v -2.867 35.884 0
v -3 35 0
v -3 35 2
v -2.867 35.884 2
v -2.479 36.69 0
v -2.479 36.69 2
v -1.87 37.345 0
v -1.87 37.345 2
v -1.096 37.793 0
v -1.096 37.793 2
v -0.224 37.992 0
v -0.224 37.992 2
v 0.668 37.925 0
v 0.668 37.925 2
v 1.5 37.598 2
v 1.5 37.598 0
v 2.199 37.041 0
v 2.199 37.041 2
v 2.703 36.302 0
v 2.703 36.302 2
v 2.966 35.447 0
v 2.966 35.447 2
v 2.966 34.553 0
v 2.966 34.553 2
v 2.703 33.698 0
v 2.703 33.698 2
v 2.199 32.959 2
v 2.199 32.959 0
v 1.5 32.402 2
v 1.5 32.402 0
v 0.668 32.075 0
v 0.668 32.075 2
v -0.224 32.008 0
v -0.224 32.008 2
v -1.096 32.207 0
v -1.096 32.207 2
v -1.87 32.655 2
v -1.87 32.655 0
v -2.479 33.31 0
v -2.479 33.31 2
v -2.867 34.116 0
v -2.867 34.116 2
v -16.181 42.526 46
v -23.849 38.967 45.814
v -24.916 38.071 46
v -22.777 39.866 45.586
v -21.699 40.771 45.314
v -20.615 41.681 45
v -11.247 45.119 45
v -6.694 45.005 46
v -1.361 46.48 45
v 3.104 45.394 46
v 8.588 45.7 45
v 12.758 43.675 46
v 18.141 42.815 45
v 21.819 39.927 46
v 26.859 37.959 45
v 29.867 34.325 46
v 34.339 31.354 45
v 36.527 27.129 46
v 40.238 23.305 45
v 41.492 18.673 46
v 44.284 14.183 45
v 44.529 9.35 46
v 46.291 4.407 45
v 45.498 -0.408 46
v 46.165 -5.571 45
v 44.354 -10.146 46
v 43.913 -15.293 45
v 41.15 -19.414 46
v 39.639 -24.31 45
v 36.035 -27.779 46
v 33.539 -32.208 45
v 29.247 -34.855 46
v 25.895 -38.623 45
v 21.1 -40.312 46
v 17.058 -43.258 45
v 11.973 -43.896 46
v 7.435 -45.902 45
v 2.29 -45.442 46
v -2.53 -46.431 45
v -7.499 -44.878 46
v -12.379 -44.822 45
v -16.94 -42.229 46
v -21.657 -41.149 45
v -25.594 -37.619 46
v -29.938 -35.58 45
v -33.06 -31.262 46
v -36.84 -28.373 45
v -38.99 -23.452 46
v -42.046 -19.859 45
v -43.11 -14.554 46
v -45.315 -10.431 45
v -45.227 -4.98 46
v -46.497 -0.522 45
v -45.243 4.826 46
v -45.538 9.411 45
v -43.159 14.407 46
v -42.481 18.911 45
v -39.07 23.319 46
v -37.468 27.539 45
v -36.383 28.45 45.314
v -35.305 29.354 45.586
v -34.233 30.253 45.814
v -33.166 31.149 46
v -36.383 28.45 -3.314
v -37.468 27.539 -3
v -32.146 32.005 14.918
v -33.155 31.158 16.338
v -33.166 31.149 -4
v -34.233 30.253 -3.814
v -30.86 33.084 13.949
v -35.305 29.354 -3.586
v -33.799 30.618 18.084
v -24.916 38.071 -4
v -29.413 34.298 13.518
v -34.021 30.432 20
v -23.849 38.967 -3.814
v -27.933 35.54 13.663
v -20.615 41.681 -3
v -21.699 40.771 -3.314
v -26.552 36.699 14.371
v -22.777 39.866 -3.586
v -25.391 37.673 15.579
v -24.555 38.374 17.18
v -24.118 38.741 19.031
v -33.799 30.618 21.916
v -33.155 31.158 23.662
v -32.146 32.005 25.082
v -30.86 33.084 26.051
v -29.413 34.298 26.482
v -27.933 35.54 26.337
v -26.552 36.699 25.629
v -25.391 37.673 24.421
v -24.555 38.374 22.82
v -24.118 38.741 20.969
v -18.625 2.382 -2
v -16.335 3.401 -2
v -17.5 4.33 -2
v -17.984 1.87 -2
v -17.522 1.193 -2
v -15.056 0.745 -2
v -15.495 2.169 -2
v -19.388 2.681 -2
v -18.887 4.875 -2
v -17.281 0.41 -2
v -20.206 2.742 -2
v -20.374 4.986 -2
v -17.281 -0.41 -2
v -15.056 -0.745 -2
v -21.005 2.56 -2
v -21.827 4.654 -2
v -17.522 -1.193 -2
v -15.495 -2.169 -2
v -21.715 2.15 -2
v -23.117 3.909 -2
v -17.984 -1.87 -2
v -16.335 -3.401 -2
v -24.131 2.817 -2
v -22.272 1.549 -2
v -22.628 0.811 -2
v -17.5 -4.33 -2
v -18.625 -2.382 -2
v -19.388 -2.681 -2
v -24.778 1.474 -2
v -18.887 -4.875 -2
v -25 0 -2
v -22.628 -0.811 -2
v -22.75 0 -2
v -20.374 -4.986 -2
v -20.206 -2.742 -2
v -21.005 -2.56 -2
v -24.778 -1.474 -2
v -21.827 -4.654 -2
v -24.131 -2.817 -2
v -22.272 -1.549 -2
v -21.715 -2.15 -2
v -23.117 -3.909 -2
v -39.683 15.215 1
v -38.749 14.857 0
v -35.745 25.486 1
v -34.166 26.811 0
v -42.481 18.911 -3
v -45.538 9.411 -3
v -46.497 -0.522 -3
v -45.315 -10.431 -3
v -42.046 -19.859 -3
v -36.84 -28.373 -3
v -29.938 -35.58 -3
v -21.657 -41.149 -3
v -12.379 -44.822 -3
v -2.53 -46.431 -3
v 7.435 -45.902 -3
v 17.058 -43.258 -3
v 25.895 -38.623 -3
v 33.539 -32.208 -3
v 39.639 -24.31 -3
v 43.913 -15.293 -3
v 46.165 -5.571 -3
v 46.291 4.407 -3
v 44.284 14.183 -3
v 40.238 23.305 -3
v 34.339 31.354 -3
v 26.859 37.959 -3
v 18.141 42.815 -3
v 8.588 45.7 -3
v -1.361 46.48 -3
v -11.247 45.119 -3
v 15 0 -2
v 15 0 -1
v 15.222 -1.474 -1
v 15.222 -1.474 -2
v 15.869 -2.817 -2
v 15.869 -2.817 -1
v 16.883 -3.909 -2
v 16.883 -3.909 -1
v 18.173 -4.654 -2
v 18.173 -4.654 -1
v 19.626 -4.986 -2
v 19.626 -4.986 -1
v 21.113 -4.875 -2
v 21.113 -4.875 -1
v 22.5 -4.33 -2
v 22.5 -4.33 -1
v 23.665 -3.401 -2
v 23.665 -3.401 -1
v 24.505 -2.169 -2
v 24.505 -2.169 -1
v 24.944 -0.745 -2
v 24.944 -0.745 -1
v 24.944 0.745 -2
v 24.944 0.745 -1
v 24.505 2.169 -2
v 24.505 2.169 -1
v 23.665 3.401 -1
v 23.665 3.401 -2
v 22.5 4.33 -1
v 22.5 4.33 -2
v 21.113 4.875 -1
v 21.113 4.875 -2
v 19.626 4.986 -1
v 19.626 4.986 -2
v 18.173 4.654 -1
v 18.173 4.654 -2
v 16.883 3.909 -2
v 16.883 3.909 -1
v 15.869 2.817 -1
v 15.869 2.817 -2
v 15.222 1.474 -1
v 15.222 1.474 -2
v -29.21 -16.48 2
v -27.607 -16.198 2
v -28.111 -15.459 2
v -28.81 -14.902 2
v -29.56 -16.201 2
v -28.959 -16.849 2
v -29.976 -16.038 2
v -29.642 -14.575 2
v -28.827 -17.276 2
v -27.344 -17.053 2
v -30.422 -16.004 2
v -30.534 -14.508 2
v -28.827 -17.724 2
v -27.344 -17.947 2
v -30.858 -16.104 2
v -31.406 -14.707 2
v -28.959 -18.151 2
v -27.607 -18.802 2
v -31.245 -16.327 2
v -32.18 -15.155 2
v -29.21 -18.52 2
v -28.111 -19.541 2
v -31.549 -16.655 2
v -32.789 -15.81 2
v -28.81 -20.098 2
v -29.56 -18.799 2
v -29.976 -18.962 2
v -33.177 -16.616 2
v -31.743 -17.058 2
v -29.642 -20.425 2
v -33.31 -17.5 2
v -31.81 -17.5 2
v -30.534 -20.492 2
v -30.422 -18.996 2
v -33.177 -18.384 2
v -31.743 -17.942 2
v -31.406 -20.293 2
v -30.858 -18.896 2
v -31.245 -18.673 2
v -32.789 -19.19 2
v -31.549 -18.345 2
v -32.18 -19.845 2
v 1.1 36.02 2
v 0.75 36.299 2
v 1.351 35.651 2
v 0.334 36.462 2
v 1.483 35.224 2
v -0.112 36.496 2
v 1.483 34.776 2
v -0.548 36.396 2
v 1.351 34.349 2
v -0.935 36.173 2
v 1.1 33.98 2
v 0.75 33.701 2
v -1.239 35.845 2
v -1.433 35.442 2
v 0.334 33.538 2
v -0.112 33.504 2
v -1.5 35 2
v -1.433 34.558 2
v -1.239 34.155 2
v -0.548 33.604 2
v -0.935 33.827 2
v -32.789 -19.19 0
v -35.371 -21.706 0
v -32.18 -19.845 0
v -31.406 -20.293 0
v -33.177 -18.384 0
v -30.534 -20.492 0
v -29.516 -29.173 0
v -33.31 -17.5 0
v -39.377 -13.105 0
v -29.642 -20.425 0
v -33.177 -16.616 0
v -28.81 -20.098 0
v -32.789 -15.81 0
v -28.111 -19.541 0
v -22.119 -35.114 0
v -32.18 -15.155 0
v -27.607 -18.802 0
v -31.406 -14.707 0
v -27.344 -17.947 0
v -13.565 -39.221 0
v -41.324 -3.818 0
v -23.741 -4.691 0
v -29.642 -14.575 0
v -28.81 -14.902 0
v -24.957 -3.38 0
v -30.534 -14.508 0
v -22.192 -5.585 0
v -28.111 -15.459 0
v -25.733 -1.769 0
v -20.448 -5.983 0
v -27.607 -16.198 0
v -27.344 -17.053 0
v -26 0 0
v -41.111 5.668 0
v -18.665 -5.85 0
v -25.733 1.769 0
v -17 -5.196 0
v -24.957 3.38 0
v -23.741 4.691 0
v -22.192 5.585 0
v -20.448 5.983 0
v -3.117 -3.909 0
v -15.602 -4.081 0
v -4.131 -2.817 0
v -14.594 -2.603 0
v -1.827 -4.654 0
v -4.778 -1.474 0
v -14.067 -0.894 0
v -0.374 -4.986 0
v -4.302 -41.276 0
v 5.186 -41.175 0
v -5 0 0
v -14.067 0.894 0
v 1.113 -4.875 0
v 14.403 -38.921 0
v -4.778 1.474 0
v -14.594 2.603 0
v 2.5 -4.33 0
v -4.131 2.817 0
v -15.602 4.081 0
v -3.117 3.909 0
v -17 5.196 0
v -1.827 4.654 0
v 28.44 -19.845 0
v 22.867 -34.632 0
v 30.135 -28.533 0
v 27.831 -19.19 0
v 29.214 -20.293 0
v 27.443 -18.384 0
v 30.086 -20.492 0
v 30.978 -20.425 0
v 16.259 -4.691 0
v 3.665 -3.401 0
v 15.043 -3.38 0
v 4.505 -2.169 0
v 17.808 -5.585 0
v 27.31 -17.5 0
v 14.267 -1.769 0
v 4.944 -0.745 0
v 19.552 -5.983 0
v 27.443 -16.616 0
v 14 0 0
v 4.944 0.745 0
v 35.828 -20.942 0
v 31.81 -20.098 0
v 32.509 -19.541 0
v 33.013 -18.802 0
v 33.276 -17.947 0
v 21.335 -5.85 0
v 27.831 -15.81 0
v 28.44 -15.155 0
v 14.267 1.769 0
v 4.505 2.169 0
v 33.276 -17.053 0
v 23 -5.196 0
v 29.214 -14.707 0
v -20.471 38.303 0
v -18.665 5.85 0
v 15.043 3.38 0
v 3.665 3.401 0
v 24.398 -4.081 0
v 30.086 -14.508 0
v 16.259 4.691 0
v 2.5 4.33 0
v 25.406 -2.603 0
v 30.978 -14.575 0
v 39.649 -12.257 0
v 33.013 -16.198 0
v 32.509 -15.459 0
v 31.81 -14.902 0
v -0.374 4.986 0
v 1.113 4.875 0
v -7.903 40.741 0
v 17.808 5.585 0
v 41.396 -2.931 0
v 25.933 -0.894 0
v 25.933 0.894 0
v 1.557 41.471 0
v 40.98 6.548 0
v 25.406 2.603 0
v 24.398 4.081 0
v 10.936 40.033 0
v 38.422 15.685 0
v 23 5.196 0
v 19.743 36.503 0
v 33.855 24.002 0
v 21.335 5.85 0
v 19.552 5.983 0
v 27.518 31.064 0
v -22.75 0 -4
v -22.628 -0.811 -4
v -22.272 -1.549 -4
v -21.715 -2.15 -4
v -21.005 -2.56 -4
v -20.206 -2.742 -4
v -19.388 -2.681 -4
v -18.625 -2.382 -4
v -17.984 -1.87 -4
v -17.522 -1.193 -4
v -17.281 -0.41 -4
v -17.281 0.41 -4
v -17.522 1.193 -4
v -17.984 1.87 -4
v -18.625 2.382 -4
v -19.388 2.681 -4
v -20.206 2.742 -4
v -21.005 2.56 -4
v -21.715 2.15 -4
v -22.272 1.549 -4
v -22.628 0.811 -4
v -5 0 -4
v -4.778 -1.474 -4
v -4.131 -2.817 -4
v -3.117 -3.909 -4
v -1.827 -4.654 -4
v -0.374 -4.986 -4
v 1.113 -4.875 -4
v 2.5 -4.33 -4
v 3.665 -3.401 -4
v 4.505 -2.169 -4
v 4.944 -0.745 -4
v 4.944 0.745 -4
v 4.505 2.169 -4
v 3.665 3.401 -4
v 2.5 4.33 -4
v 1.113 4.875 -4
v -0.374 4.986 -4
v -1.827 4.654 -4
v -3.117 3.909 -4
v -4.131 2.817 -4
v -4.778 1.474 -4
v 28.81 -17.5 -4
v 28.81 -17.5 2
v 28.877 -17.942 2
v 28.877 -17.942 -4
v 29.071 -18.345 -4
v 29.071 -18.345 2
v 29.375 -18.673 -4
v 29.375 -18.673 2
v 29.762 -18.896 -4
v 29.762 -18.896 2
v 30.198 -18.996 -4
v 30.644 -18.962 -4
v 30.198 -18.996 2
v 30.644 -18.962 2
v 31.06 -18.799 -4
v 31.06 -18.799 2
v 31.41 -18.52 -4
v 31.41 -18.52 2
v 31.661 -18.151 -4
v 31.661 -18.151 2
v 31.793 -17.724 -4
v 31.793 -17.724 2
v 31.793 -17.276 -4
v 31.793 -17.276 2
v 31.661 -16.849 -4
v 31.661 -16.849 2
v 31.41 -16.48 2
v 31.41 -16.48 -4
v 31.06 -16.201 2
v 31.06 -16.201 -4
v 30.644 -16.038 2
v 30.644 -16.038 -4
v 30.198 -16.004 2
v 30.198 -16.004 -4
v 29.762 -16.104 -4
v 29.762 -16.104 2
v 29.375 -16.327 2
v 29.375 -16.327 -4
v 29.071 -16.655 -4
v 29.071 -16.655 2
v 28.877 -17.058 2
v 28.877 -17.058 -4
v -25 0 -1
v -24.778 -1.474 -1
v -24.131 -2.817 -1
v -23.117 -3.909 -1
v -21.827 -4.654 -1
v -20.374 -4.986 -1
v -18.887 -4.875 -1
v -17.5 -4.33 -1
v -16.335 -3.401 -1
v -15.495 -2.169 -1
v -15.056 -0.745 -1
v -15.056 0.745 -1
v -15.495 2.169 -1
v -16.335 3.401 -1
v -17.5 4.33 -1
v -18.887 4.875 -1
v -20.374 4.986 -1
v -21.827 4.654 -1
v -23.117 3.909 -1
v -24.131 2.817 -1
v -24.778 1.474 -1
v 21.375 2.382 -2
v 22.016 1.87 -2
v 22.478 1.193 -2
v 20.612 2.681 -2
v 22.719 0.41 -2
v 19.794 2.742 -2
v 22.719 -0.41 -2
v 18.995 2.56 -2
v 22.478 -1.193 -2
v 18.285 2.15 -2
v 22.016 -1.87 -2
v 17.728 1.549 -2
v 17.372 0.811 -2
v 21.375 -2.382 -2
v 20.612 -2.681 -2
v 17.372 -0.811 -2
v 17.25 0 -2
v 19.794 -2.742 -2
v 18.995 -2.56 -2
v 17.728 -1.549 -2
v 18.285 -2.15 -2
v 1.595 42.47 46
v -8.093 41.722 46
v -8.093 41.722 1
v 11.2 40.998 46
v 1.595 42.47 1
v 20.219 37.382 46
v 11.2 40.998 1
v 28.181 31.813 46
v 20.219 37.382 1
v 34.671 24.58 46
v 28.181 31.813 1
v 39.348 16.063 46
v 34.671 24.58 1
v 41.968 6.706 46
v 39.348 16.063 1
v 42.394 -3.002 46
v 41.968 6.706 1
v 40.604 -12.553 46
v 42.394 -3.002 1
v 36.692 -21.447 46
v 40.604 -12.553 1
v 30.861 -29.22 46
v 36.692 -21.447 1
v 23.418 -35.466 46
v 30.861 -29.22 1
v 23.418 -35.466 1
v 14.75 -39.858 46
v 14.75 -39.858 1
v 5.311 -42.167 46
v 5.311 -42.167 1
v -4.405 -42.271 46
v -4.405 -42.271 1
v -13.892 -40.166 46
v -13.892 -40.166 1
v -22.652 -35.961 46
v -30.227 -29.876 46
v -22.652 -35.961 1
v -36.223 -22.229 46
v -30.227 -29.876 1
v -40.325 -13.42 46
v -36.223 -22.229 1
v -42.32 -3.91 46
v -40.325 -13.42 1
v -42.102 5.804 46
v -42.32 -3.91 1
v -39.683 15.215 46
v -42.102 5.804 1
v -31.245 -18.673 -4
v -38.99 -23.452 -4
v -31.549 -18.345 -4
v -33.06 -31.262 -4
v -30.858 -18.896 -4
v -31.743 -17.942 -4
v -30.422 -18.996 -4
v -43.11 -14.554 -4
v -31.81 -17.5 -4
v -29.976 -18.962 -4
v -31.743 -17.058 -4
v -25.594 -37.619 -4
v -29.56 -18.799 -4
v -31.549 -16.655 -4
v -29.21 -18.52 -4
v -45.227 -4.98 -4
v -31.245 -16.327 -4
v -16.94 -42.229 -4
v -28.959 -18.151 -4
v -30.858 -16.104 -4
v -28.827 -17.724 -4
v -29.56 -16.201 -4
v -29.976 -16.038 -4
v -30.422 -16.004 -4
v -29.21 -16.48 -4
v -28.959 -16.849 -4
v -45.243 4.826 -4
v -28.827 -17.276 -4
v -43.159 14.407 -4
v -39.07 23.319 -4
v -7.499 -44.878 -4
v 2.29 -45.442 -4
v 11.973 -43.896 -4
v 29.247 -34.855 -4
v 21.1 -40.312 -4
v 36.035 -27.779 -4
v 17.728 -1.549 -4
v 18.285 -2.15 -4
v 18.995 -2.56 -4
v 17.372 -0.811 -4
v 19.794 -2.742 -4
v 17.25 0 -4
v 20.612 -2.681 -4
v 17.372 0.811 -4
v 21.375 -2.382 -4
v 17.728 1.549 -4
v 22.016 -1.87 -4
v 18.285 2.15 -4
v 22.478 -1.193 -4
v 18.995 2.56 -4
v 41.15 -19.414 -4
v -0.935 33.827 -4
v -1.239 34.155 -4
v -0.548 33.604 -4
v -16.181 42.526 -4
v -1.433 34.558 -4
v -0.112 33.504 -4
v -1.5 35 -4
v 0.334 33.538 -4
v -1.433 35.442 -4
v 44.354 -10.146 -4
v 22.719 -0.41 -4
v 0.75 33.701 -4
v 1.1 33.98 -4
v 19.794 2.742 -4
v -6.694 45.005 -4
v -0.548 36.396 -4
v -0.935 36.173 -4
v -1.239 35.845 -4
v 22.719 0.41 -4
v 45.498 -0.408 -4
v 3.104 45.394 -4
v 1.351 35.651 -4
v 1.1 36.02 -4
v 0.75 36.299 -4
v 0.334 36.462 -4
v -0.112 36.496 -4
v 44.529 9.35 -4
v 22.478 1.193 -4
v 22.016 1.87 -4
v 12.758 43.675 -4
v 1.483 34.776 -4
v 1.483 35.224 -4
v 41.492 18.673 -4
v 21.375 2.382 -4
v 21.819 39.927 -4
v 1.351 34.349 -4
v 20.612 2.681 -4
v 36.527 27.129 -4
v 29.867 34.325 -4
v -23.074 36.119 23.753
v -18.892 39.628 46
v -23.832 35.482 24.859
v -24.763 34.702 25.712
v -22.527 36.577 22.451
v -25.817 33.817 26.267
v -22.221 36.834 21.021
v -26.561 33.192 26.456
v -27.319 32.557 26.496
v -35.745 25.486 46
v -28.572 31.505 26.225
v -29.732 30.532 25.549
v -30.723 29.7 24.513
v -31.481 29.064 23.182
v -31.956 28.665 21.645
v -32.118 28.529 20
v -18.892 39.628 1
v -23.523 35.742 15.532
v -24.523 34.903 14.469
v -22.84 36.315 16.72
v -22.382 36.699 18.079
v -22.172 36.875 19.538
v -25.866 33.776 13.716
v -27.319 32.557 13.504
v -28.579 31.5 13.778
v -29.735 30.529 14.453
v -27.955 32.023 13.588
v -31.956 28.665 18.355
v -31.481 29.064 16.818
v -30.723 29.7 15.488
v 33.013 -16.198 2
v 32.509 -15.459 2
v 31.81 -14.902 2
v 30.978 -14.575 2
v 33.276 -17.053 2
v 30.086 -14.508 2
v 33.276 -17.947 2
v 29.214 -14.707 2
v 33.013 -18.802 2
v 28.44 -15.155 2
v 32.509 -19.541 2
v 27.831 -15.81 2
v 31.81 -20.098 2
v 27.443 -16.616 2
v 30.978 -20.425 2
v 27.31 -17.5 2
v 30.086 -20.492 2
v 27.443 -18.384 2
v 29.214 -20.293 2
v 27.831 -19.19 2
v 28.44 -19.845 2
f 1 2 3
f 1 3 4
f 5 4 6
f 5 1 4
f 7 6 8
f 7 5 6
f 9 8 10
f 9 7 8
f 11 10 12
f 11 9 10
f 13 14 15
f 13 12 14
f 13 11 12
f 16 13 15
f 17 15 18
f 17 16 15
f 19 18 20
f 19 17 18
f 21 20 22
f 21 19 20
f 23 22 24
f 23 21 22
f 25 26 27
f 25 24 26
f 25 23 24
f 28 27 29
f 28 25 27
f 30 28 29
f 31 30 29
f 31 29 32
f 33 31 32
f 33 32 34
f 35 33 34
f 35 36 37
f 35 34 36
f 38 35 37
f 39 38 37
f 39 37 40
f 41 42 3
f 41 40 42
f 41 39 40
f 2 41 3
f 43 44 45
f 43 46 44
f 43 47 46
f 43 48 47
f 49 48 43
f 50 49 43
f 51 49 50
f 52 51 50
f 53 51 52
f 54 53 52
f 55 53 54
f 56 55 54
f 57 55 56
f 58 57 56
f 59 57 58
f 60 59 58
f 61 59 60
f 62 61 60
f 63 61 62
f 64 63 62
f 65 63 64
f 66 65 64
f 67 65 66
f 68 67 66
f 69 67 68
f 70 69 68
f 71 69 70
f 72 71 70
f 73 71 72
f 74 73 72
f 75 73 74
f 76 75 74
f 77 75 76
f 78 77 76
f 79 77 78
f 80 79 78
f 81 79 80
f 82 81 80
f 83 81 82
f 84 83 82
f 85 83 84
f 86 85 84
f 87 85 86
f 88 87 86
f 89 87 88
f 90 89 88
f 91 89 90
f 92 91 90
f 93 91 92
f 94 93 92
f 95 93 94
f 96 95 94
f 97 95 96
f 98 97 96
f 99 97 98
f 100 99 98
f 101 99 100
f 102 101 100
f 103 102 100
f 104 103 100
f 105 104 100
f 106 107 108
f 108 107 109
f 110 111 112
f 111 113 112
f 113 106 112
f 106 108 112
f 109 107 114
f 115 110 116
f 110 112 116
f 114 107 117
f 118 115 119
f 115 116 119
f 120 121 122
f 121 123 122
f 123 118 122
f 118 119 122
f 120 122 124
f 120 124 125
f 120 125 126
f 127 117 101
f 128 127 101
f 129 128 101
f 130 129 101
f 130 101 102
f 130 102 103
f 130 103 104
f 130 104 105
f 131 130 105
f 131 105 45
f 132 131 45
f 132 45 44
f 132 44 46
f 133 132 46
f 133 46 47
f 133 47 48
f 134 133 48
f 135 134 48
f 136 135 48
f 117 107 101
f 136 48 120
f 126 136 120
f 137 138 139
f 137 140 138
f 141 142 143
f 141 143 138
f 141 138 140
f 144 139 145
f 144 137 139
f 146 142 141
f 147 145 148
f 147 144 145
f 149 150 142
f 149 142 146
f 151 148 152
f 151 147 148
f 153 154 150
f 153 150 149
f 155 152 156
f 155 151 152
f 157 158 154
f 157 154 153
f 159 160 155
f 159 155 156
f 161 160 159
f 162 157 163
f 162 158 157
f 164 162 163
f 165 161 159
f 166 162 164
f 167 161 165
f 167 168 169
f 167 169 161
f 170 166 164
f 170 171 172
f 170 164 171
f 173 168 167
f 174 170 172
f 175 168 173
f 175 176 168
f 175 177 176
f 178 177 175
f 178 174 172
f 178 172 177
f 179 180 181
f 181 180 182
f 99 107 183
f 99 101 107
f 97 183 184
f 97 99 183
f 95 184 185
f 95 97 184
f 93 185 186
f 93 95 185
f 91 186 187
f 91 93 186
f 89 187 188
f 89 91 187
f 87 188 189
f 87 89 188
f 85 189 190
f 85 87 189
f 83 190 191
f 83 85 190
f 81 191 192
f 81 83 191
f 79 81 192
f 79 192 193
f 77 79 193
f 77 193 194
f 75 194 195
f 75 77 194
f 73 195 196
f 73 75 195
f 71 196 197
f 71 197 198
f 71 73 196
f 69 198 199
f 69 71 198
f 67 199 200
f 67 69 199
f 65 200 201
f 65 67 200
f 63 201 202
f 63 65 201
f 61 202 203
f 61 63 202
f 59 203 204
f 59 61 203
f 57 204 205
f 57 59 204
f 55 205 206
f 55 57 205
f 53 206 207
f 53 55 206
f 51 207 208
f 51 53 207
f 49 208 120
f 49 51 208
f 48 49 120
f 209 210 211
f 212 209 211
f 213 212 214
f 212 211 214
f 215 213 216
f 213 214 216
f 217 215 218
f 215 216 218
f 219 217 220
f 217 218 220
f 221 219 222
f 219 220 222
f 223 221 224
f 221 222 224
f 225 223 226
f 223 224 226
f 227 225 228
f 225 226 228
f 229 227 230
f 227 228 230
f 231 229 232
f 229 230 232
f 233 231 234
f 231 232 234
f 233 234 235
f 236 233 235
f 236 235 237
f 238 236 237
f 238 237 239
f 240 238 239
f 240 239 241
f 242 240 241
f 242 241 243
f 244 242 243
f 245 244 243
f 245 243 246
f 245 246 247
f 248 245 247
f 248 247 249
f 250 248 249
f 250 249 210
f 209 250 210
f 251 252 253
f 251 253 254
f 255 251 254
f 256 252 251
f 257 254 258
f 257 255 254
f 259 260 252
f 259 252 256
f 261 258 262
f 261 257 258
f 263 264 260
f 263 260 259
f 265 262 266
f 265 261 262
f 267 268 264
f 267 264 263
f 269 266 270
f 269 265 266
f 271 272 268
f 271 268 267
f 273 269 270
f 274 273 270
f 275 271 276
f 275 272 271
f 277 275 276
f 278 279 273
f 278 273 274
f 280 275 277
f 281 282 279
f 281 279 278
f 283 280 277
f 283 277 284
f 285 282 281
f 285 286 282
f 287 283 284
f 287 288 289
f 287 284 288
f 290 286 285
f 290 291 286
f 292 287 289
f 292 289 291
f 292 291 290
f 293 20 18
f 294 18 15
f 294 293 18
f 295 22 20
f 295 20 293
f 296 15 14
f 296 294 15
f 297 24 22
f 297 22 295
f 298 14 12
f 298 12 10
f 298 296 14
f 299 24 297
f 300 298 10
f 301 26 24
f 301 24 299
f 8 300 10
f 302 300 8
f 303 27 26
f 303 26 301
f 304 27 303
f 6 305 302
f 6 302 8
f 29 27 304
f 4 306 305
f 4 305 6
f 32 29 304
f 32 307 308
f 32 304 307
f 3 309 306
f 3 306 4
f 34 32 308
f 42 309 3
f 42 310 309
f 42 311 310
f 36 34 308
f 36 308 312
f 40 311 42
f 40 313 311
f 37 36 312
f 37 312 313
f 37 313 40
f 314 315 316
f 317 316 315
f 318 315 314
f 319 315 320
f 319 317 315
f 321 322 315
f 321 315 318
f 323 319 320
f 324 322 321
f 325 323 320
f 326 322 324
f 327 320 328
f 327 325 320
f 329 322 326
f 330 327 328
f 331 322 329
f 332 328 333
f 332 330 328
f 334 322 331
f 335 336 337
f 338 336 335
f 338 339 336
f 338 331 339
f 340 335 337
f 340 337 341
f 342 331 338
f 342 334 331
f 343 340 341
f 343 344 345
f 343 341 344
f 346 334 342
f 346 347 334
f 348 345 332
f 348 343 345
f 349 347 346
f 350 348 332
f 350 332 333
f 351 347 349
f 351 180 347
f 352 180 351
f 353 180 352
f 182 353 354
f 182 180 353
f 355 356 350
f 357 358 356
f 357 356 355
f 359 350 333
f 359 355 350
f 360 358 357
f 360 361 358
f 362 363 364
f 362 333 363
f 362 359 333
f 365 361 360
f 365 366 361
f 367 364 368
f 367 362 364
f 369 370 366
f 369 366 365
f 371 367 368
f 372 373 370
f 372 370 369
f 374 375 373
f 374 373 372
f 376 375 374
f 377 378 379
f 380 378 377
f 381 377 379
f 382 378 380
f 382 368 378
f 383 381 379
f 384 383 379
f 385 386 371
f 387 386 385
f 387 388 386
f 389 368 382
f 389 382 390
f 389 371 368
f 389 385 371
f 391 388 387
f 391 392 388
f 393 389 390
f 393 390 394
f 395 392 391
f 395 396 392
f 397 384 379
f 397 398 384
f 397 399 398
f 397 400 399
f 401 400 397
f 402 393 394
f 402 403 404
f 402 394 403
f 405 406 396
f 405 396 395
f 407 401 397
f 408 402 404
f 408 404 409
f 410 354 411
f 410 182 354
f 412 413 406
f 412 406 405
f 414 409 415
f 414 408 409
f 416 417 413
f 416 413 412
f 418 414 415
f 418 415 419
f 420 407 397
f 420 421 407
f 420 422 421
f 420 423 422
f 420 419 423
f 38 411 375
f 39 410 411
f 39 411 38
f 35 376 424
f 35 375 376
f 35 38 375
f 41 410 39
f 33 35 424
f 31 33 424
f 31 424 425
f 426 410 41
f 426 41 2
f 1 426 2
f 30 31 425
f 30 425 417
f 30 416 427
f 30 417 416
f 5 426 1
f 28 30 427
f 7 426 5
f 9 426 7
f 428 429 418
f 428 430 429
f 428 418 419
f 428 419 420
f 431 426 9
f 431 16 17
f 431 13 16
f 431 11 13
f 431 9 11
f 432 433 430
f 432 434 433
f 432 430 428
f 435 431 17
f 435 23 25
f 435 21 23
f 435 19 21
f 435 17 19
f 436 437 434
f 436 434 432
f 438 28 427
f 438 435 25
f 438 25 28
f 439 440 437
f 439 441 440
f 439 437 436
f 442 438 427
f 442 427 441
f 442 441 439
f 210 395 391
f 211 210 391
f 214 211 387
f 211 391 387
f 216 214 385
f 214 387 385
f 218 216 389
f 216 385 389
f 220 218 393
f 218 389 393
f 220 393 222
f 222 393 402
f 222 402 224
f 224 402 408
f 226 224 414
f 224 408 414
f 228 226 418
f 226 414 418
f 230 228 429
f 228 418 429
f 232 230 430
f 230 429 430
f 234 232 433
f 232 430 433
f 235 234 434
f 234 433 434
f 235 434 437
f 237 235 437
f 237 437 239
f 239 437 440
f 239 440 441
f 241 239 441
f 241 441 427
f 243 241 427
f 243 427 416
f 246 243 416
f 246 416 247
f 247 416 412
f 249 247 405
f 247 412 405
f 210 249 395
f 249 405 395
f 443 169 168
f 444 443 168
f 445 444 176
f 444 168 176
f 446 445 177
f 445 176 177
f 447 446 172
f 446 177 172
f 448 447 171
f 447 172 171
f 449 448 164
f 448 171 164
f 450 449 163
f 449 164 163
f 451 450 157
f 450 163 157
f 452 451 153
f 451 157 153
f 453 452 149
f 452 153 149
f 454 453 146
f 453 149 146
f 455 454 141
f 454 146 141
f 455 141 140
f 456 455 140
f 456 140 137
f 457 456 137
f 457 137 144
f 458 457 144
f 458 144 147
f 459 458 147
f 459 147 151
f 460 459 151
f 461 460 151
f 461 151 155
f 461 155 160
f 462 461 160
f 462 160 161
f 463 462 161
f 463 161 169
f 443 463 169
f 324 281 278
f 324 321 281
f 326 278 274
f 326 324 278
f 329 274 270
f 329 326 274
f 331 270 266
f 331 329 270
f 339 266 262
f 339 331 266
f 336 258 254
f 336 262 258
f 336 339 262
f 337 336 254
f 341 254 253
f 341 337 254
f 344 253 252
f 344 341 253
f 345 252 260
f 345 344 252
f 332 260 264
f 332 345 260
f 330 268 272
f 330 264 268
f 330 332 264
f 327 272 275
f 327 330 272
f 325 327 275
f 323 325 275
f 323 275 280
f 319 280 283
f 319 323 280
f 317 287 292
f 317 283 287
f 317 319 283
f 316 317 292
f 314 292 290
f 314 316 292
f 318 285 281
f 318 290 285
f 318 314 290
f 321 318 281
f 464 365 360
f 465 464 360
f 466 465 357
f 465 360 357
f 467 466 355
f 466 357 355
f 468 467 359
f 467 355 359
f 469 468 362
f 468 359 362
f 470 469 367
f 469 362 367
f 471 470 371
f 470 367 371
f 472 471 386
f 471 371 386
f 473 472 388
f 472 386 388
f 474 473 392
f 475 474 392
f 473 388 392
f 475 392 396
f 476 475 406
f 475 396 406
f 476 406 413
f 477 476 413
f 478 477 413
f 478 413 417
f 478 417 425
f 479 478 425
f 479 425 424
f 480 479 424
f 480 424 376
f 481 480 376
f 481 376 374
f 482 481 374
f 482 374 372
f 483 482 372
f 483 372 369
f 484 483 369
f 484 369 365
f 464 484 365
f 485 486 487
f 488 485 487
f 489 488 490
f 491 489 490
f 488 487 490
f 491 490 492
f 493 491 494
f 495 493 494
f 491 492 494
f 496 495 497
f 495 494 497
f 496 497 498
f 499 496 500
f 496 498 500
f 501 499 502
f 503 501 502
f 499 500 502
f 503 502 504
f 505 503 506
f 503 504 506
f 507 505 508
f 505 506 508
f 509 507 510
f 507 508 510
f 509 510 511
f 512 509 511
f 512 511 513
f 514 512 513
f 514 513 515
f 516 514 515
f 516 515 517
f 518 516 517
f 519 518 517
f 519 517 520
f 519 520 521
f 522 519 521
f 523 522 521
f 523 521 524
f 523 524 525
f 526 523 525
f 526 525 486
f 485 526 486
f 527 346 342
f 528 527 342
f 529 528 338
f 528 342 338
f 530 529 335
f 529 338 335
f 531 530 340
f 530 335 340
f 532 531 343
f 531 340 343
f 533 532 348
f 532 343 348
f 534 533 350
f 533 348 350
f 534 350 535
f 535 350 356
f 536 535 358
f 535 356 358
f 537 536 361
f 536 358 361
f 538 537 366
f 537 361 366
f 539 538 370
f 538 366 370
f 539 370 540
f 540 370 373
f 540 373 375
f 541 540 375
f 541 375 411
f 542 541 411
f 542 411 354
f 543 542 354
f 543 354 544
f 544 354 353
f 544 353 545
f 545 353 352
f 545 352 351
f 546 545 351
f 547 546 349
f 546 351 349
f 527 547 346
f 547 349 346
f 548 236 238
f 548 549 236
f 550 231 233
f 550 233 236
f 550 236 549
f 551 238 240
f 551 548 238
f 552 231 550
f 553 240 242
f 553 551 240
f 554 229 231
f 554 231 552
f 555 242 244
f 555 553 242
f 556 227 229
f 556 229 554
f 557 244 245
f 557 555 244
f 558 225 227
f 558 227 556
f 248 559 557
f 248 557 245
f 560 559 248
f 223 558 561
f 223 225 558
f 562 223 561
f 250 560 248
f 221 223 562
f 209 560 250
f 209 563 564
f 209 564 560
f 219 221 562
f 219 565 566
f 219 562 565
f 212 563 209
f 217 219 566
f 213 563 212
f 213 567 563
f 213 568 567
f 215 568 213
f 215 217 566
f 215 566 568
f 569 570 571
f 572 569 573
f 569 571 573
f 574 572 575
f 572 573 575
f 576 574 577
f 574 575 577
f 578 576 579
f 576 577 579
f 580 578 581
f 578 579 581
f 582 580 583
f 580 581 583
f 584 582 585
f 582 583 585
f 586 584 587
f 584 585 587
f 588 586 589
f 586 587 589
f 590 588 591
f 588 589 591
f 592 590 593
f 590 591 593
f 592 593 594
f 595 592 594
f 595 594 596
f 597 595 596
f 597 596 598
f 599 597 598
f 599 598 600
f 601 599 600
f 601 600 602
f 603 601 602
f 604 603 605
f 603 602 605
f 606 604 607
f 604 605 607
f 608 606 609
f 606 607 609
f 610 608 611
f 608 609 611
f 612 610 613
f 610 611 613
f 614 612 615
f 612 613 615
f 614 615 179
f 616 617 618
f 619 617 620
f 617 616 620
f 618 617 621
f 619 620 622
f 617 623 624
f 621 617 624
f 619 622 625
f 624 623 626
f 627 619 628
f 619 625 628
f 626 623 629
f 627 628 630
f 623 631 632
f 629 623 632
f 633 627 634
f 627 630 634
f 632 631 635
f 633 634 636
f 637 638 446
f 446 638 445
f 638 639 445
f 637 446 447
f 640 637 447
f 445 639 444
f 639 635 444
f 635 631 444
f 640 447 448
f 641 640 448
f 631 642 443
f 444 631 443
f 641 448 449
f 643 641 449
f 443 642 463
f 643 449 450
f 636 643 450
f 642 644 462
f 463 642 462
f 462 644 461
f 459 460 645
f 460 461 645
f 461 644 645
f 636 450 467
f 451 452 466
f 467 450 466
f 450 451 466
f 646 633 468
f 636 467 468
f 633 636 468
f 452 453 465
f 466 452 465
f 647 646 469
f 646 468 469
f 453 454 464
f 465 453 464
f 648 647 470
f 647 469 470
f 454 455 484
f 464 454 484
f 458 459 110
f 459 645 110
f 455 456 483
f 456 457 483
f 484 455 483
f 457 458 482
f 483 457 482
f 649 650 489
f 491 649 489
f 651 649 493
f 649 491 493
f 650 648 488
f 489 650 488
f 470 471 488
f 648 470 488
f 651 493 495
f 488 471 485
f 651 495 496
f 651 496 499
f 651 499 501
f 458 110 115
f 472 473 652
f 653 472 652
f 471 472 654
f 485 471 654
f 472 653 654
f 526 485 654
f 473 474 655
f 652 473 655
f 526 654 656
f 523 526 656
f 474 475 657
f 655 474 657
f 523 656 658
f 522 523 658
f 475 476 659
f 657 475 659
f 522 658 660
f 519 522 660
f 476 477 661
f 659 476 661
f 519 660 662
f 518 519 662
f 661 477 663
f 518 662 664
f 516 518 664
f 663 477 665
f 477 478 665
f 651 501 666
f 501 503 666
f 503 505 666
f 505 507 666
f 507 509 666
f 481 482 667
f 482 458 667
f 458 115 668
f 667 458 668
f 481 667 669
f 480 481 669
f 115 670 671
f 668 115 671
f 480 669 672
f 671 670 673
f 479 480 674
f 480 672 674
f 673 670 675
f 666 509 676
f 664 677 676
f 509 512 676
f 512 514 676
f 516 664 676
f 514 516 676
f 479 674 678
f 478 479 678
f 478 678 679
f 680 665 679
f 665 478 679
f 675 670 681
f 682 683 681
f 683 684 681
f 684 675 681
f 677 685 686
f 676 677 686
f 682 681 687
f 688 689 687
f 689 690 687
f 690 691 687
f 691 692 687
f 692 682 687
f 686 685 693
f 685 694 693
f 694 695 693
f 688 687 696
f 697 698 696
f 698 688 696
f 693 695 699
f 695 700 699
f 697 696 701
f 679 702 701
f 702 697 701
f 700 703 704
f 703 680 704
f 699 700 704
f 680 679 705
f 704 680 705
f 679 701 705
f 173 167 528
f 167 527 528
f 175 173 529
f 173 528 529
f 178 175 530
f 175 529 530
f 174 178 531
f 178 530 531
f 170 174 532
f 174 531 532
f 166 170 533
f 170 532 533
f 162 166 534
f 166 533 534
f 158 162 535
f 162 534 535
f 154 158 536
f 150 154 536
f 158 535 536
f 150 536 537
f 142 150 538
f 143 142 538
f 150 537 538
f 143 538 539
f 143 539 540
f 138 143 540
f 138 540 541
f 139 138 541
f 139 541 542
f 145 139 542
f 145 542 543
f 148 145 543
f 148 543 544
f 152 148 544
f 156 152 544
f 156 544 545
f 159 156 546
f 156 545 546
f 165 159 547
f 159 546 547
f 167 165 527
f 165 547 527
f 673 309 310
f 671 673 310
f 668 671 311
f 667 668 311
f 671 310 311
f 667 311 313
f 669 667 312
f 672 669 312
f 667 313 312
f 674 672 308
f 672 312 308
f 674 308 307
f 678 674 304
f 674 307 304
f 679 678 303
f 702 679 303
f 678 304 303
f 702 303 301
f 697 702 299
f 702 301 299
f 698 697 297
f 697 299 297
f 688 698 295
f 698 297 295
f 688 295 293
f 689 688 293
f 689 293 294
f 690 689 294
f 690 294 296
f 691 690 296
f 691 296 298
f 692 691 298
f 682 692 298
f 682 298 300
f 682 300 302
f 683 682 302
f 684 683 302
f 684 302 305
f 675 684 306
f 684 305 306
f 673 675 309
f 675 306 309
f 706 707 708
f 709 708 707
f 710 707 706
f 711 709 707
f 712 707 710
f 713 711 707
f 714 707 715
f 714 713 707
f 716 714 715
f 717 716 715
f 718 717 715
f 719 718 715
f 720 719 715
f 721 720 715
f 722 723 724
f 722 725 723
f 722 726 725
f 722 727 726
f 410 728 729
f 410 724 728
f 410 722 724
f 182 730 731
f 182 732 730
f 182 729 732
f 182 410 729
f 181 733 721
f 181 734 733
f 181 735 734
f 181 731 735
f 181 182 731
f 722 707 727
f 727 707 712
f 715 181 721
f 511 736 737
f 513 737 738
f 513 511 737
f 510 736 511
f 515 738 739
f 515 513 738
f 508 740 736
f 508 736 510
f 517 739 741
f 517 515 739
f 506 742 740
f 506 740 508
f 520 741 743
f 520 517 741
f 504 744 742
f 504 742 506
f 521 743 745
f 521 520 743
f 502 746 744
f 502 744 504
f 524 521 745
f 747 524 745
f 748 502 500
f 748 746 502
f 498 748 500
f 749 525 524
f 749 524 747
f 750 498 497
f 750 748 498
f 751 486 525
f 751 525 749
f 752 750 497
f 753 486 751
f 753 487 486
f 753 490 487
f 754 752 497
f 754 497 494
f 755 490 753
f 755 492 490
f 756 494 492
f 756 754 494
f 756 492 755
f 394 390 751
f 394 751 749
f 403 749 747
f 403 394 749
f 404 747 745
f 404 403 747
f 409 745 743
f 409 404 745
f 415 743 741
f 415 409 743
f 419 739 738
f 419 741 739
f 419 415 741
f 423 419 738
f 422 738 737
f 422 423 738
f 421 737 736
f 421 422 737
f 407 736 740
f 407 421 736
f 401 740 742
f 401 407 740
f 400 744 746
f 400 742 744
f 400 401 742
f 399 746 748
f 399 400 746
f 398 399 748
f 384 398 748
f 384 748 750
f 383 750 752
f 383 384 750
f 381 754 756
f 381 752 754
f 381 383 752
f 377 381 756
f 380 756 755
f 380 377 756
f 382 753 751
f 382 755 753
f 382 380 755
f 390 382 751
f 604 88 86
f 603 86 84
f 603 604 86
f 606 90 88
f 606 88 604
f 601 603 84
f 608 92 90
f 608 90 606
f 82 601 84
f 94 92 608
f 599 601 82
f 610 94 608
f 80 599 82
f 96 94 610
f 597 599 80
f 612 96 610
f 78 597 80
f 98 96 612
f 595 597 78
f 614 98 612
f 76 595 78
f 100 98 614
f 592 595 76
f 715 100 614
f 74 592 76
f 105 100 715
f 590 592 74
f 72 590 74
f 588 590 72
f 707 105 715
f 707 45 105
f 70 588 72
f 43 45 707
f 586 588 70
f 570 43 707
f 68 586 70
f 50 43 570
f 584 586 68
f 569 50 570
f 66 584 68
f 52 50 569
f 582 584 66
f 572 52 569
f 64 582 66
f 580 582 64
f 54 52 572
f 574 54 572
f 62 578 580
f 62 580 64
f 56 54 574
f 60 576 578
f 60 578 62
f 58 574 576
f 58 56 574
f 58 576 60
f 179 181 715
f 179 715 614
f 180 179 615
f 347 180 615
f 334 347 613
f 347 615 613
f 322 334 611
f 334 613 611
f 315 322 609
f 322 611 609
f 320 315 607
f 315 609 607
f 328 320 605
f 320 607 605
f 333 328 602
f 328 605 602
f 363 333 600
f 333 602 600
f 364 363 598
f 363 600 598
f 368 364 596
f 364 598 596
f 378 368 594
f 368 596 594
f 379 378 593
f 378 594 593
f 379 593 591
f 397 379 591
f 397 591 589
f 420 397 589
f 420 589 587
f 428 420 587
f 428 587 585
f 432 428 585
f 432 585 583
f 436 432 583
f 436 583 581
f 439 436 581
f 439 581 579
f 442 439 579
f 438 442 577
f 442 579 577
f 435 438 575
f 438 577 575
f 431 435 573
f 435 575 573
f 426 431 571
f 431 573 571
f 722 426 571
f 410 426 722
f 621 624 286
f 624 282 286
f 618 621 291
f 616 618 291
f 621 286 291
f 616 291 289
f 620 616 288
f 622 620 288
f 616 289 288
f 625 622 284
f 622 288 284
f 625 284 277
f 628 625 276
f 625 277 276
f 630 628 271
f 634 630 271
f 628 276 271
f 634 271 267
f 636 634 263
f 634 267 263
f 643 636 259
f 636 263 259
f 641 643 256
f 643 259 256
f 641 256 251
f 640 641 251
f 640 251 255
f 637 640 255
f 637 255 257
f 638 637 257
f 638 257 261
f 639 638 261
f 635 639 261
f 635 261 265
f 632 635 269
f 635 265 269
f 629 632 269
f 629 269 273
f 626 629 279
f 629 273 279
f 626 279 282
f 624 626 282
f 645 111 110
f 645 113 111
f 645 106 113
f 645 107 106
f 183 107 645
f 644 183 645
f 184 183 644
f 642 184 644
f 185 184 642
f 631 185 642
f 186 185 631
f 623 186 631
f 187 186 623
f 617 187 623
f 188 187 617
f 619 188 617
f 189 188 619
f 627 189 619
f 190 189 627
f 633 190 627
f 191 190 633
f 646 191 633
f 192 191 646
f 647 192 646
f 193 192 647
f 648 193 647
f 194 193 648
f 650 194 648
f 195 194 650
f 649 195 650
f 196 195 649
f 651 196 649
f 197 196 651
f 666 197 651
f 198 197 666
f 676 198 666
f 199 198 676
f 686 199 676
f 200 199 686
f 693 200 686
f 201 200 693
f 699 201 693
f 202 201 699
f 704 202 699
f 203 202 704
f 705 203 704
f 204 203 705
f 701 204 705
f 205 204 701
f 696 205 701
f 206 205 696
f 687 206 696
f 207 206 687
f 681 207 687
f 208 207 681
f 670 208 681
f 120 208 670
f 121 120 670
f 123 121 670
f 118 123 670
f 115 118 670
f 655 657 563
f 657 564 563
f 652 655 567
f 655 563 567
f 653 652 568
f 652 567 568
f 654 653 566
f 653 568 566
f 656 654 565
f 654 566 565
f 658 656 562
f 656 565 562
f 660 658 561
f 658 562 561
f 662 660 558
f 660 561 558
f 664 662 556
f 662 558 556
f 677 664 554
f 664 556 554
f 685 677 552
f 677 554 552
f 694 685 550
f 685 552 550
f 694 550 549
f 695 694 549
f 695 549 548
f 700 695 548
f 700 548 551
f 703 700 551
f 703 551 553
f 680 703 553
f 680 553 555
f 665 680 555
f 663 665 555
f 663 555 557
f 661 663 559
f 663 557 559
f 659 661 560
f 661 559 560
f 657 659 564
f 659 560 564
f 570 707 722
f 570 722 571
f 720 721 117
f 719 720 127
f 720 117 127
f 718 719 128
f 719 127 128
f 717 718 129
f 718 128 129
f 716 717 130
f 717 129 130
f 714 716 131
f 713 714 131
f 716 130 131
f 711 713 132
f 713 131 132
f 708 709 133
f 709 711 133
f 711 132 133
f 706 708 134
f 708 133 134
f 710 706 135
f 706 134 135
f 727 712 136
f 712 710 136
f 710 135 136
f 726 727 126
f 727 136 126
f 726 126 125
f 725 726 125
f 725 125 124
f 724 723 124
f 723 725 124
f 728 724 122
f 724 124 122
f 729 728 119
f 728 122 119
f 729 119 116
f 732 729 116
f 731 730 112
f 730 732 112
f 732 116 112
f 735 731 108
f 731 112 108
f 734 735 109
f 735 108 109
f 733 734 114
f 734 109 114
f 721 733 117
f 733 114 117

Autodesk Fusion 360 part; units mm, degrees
sketch "Sketch1" plane through (0, 0, 0) normal (0, 0, 1) x (1, 0, 0)
  circle A0 centre (0, 0) radius 42.5
  circle A1 centre (0, 0) radius 46.5
  dimension "d1" = 85
  dimension "d2" = 93
extrude "Extrude1" add sketch "Sketch1" along normal blind 46 makes body 1
extrude "Extrude2" add sketch "Sketch1" against normal blind 4 contours A0 | A1 bodies 1
ref_plane "WorkPlane1" through (0, 0, 46) normal (0, 0, 1) x (1, 0, 0)
sketch "Sketch3" plane through (0, 0, 46) normal (0, 0, 1) x (1, 0, 0)
  circle A0 centre (0, 0) radius 46.5
  circle A1 centre (0, 0) radius 42.5
  circle A2 centre (0, 0) radius 49
  circle A3 centre (0, 0) radius 40.5
  circle A4 centre (0, 0) radius 46.9
  dimension "d9" = 98
  dimension "d10" = 81
  dimension "d50" = 0.4
extrude "Extrude3" add sketch "Sketch3" along normal blind 4 separate body contours A0 | A1 | A2 | A4 makes body 2
extrude "Extrude4" add sketch "Sketch3" against normal blind 12 contours A2 bodies 2
chamfer "Chamfer1" distance 3 angle 45 1 edges at (-37.7593, 14.6454, 50) on bodies 2
chamfer "Chamfer2" distance 2 angle 65 1 edges at (-45.684, -17.7192, 50) measured on face at (46.8223, -4.5955, 50) on bodies 2
chamfer "Chamfer3" distance 1 angle 45 1 edges at (-45.684, 17.7192, 34) measured on face at (48.1176, -2.4344, 34) on bodies 2
chamfer "Chamfer4" distance 1 angle 45 1 edges at (-43.3532, 16.8151, -4) measured on face at (10.204, -8.5364, -4) on bodies 1
ref_plane "WorkPlane2" through (0, 0, 0) normal (0, 0, -1) x (-1, 0, 0)
sketch "Sketch4" plane through (0, 0, 0) normal (0, 0, -1) x (1, 0, 0)
  circle A0 centre (0, 0) radius 46.5 construction
  line L0 (-37.4678, -27.5394) -> (-20.6148, -41.6807)
  line L1 (-20.6148, -41.6807) -> (-26.0712, -48.1834)
  line L2 (-26.0712, -48.1834) -> (-42.9242, -34.0421)
  line L3 (-42.9242, -34.0421) -> (-37.4678, -27.5394)
  line L4 (0, 0) -> (-58.0825, -69.2201) construction
  line L5 (-18.892, -39.6276) -> (-35.745, -25.4862)
  circle A1 centre (0, 0) radius 42.5
  line L6 (-18.892, -39.6276) -> (-8.0933, -41.7223)
  line L7 (-35.745, -25.4862) -> (-39.683, -15.2153)
  line L8 (-39.683, -15.2153) -> (-8.0933, -41.7223)
  line L9 (0, 0) -> (-65, 0) construction
  dimension "d26" = 22
  dimension "d58" = 50
extrude "Extrude5" cut sketch "Sketch4" along normal through all and the other way through all contours L0 L1 L2 L3 bodies 1
sketch "Sketch5" plane through (-29.0413, 34.61, 0) normal (-0.642788, 0.766044, 0) x (-0.766044, -0.642788, 0)
  line L0 (-11, 46) -> (-11, -3)
  circle A0 centre (0, 20) radius 6.5
  line L1 (11, 46) -> (-11, 46)
  spline S0 degree 2 poles (-5.3852, -4) (-8.1621, -3.6713) (-11, -3) knots 0 0 0 0.570553 0.570553 0.570553 weights 1 1.001868 1
  line L2 (-5.3852, -4) -> (5.3852, -4)
  spline S1 degree 2 poles (11, -3) (8.1621, -3.6713) (5.3852, -4) knots 0 0 0 0.570553 0.570553 0.570553 weights 1 1.001868 1
  line L3 (11, -3) -> (11, 46)
  line L4 (-11, 0) -> (11, 0)
  dimension "d30" = 13
  dimension "d61" = 20
  dimension "d62" = 11
extrude "Extrude6" cut sketch "Sketch5" against normal blind 15 contours A0 bodies 1
sketch "Sketch6" plane through (0, 0, 0) normal (0, 0, 1) x (-1, 0, 0)
  circle A0 centre (0, -35) radius 3
  circle A1 centre (30.31, 17.5) radius 3
  circle A2 centre (-30.31, 17.5) radius 3
  circle A3 centre (0, 0) radius 5
  circle A4 centre (0, 0) radius 42.5
  circle A5 centre (20, 0) radius 2.75
  line L0 (0, 0) -> (65, 0)
  circle A6 centre (-20, 0) radius 2.75
  circle A7 centre (20, 0) radius 5
  circle A8 centre (-20, 0) radius 5
  dimension "d33" = 6
  dimension "d34" = 6
  dimension "d35" = 6
  dimension "d36" = 35
  dimension "d37" = 17.5
  dimension "d38" = 17.5
  dimension "d39" = 30.31
  dimension "d40" = 30.31
  dimension "d42" = 10
  dimension "d63" = 5.5
  dimension "d64" = 5.5
  dimension "d65" = 10
  dimension "d66" = 10
  dimension "d67" = 20
  dimension "d68" = 20
extrude "Extrude7" cut sketch "Sketch6" against normal through all contours A3 | A5 L0 | A5 L0 | A6 bodies 1
extrude "Extrude8" add sketch "Sketch6" along normal blind 2 contours A0 | A1 | A2 bodies 1
sketch "Sketch7" plane through (0, 0, 2) normal (0, 0, 1) x (-1, 0, 0)
  circle A0 centre (0, -35) radius 3
  circle A1 centre (0, -35) radius 1.5
  circle A2 centre (30.31, 17.5) radius 1.5
  circle A3 centre (-30.31, 17.5) radius 1.5
  point P0 (30.31, 17.5)
  point P1 (-30.31, 17.5)
  dimension "d45" = 3
  dimension "d46" = 3
  dimension "d47" = 3
extrude "Extrude9" cut sketch "Sketch7" against normal through all contours A1 | A2 | A3 bodies 1
chamfer "Chamfer5" distance 1 angle 45 1 edges at (-43.3532, -16.8151, 46) measured on face at (-19.1306, 39.3496, 46) on bodies 1
extrude "Extrude11" cut sketch "Sketch4" against normal through all contours L5 A1 L6 | L5 A1 L7 bodies 1
chamfer "Chamfer7" distance 1 angle 45 3 edges at (-13.4926, 40.6749, 0) (27.3185, -32.5569, 0) (-37.714, 20.3508, 0) on bodies 1
extrude "Extrude12" cut sketch "Sketch6" against normal blind 2 contours A5 L0 A7 | A5 L0 A7 | A8 bodies 1
chamfer "Chamfer8" distance 1 angle 45 2 edges at (-15.3384, -1.8081, 0) (24.6616, -1.8081, 0) on bodies 1
hidden bodies 2
